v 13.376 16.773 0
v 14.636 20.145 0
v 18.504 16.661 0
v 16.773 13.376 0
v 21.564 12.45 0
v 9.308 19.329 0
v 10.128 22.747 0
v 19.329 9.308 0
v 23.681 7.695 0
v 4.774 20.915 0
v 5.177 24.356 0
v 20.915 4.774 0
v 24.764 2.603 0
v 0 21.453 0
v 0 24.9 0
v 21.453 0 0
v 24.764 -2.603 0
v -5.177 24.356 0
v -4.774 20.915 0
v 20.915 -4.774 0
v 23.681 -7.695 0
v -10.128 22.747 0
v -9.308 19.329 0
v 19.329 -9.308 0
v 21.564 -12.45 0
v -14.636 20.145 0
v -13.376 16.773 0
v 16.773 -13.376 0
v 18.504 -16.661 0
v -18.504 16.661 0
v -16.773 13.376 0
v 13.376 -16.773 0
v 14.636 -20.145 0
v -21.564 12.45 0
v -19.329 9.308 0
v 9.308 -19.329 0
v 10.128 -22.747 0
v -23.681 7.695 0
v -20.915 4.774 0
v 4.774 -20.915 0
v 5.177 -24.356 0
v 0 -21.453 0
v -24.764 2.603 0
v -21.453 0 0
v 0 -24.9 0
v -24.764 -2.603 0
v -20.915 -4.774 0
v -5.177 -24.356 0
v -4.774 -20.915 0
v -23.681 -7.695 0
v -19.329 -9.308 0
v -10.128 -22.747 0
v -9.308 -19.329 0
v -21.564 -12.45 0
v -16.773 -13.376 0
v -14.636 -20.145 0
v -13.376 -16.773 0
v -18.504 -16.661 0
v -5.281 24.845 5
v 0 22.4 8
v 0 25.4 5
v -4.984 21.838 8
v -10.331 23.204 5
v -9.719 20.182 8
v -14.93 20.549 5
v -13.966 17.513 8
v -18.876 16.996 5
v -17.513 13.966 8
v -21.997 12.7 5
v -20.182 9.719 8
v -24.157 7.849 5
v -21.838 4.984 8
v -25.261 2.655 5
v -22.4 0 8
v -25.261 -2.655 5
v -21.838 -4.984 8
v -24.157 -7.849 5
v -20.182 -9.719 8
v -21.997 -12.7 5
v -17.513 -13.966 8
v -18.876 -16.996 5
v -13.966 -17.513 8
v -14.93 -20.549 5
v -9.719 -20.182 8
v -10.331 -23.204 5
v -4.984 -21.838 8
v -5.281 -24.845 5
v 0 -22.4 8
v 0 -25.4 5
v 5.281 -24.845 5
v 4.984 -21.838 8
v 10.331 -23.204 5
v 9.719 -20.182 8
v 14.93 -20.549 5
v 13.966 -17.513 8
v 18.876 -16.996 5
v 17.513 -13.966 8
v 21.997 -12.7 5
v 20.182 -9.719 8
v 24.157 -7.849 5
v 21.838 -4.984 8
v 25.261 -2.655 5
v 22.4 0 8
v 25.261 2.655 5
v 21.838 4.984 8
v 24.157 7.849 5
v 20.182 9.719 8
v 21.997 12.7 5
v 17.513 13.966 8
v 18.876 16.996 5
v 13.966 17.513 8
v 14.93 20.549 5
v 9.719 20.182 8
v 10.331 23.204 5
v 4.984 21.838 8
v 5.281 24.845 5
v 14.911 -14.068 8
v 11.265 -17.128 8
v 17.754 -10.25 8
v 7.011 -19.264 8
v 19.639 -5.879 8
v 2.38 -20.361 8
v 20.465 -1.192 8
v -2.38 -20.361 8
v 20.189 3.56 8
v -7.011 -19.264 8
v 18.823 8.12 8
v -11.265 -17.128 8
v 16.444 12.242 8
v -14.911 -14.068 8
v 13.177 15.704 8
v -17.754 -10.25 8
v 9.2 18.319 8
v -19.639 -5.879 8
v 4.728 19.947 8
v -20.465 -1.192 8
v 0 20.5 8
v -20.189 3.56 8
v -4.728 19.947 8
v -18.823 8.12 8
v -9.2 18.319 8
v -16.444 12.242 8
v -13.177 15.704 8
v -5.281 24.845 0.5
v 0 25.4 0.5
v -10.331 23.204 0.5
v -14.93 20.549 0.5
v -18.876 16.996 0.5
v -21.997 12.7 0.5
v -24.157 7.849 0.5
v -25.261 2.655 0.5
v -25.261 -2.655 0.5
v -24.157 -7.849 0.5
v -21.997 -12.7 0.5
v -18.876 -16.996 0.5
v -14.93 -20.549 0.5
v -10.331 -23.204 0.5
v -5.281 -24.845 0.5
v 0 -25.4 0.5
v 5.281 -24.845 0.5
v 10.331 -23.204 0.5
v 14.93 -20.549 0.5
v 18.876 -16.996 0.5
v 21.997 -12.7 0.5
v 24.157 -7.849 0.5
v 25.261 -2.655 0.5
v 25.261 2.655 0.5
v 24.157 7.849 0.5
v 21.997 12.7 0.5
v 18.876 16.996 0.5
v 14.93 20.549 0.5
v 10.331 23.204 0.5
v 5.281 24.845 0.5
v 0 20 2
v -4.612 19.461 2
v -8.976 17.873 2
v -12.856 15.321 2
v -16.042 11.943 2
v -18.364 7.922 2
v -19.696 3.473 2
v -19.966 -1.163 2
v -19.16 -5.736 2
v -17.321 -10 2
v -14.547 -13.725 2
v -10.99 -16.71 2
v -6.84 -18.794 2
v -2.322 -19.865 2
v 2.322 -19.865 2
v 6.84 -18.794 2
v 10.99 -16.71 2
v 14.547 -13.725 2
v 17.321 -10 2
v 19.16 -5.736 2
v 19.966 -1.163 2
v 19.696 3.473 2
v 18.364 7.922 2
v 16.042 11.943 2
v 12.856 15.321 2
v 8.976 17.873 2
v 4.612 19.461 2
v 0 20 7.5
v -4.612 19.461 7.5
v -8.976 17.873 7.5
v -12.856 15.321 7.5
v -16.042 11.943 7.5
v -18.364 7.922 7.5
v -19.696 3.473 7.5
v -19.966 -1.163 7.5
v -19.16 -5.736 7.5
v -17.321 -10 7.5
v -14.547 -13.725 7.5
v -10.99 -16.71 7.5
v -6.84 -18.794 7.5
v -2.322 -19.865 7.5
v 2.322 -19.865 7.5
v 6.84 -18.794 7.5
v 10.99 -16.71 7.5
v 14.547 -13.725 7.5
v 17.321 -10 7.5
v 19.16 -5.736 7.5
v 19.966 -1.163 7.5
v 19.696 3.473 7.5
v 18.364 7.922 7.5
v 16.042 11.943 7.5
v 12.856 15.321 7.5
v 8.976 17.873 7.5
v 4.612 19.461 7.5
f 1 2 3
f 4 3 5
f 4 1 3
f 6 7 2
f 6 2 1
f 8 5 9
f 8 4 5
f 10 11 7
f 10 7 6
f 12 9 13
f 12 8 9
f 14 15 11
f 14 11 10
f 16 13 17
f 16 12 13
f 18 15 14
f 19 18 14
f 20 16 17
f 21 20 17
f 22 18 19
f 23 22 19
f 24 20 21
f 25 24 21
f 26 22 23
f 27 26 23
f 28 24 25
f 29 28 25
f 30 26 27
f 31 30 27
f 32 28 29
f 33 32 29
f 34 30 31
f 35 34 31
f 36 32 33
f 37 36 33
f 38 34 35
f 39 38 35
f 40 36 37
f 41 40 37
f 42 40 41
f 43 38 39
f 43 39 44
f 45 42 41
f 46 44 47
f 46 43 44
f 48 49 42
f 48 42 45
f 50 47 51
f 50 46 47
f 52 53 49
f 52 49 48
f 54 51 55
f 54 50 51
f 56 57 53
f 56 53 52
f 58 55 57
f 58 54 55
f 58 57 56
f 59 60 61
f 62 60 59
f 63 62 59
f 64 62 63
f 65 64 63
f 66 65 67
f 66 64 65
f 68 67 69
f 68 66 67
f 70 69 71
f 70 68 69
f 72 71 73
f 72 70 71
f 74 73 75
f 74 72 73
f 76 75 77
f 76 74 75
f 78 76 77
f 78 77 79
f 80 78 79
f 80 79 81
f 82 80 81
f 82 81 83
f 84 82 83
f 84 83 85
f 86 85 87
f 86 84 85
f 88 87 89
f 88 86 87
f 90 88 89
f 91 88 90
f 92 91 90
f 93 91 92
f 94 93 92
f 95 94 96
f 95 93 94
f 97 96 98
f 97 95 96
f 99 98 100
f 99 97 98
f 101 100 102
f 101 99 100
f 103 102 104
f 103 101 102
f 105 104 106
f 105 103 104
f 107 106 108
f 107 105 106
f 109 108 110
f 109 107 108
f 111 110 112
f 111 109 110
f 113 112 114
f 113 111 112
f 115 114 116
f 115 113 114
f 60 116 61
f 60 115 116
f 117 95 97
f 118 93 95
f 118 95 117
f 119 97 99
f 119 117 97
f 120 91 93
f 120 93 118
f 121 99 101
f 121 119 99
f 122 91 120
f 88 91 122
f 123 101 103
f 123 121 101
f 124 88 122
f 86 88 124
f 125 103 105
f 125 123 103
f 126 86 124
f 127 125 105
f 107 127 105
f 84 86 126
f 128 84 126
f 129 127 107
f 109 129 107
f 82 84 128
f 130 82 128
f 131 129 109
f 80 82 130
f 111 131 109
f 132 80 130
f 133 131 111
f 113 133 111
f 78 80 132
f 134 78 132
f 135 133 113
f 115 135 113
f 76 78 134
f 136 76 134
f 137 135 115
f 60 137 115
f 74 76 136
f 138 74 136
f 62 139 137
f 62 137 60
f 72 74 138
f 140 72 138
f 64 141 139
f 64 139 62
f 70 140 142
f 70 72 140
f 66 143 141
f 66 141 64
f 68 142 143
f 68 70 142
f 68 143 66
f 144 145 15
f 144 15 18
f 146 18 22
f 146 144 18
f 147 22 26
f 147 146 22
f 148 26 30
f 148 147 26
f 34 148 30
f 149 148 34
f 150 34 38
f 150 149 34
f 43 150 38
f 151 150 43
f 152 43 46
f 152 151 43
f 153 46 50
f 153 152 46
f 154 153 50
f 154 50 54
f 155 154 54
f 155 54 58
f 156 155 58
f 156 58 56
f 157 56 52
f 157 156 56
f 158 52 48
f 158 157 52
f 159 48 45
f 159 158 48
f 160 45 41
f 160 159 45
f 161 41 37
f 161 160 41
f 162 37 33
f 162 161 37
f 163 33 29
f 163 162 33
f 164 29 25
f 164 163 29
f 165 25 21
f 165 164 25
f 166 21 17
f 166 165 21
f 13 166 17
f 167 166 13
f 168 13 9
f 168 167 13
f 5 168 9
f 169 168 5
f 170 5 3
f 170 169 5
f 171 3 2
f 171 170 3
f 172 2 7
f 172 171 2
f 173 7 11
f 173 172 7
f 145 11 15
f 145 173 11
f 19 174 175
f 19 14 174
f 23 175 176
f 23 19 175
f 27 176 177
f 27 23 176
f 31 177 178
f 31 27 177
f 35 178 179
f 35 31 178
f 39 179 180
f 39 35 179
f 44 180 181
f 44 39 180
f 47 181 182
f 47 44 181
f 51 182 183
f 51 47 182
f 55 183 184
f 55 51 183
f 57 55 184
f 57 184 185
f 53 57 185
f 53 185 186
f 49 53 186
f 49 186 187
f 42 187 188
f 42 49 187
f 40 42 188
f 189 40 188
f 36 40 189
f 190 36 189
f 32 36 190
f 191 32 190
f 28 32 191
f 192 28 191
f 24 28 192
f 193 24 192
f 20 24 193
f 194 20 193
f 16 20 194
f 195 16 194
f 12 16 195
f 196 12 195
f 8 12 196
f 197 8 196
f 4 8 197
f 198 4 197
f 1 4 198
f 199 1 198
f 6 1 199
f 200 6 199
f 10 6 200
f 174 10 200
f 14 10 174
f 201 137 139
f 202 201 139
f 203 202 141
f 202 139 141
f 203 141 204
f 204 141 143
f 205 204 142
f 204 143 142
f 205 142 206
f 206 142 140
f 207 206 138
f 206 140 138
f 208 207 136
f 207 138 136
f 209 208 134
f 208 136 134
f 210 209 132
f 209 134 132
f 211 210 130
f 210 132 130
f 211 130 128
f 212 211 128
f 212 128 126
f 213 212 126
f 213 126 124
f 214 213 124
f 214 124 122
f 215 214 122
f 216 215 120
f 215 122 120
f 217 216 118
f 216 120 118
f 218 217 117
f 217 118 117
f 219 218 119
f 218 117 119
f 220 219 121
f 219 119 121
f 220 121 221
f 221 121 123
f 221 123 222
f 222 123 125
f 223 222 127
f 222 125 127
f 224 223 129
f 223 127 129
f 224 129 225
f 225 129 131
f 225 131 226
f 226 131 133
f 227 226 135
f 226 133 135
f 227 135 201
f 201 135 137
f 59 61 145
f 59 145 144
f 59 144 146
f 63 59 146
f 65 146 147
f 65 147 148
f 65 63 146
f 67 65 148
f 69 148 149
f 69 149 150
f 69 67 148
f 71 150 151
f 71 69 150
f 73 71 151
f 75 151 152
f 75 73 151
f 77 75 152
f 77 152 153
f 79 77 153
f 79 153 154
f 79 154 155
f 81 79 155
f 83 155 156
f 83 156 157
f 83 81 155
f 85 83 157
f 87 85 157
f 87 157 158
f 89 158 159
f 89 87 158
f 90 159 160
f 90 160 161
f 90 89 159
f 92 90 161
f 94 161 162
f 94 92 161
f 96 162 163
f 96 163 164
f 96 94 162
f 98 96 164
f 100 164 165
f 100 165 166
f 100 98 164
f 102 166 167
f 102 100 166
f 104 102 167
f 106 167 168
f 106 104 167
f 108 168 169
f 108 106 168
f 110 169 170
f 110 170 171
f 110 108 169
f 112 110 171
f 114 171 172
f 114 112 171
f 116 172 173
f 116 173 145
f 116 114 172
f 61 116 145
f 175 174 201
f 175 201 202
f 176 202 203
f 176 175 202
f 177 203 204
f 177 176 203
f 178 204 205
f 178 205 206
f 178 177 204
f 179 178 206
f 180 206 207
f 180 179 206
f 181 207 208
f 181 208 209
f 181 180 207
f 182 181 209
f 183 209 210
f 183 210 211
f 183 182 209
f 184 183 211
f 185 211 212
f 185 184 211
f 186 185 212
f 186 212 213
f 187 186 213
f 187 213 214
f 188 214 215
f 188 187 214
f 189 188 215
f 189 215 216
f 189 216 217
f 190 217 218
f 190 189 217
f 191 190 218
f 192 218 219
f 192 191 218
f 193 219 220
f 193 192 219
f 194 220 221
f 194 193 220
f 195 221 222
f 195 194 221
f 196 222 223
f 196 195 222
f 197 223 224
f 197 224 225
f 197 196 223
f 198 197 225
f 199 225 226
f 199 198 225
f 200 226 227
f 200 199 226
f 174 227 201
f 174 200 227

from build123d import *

# Parameters (mm, degrees)
F2_SIZE = 0.5
F3_SIZE = 0.5


with BuildPart() as f1:
    # F0 (on Right) → F1 (revolve)
    with BuildSketch(Plane.YZ):
        Polygon((25.4, 5), (22.4, 8), (20, 8), (20, 2), (21.453085, 0), (25.4, 0), align=None)
    revolve(axis=Axis((0, 0, 20.029662), (0, 0, 1)))

    # F2
    f2_edges = [f1.edges().sort_by_distance(p)[0] for p in [
        (0, -25.4, 0),
    ]]
    chamfer(f2_edges, length=F2_SIZE)

    # F3
    f3_edges = [f1.edges().sort_by_distance(p)[0] for p in [
        (0, -20, 8),
    ]]
    chamfer(f3_edges, length=F3_SIZE)


solid = f1.part
